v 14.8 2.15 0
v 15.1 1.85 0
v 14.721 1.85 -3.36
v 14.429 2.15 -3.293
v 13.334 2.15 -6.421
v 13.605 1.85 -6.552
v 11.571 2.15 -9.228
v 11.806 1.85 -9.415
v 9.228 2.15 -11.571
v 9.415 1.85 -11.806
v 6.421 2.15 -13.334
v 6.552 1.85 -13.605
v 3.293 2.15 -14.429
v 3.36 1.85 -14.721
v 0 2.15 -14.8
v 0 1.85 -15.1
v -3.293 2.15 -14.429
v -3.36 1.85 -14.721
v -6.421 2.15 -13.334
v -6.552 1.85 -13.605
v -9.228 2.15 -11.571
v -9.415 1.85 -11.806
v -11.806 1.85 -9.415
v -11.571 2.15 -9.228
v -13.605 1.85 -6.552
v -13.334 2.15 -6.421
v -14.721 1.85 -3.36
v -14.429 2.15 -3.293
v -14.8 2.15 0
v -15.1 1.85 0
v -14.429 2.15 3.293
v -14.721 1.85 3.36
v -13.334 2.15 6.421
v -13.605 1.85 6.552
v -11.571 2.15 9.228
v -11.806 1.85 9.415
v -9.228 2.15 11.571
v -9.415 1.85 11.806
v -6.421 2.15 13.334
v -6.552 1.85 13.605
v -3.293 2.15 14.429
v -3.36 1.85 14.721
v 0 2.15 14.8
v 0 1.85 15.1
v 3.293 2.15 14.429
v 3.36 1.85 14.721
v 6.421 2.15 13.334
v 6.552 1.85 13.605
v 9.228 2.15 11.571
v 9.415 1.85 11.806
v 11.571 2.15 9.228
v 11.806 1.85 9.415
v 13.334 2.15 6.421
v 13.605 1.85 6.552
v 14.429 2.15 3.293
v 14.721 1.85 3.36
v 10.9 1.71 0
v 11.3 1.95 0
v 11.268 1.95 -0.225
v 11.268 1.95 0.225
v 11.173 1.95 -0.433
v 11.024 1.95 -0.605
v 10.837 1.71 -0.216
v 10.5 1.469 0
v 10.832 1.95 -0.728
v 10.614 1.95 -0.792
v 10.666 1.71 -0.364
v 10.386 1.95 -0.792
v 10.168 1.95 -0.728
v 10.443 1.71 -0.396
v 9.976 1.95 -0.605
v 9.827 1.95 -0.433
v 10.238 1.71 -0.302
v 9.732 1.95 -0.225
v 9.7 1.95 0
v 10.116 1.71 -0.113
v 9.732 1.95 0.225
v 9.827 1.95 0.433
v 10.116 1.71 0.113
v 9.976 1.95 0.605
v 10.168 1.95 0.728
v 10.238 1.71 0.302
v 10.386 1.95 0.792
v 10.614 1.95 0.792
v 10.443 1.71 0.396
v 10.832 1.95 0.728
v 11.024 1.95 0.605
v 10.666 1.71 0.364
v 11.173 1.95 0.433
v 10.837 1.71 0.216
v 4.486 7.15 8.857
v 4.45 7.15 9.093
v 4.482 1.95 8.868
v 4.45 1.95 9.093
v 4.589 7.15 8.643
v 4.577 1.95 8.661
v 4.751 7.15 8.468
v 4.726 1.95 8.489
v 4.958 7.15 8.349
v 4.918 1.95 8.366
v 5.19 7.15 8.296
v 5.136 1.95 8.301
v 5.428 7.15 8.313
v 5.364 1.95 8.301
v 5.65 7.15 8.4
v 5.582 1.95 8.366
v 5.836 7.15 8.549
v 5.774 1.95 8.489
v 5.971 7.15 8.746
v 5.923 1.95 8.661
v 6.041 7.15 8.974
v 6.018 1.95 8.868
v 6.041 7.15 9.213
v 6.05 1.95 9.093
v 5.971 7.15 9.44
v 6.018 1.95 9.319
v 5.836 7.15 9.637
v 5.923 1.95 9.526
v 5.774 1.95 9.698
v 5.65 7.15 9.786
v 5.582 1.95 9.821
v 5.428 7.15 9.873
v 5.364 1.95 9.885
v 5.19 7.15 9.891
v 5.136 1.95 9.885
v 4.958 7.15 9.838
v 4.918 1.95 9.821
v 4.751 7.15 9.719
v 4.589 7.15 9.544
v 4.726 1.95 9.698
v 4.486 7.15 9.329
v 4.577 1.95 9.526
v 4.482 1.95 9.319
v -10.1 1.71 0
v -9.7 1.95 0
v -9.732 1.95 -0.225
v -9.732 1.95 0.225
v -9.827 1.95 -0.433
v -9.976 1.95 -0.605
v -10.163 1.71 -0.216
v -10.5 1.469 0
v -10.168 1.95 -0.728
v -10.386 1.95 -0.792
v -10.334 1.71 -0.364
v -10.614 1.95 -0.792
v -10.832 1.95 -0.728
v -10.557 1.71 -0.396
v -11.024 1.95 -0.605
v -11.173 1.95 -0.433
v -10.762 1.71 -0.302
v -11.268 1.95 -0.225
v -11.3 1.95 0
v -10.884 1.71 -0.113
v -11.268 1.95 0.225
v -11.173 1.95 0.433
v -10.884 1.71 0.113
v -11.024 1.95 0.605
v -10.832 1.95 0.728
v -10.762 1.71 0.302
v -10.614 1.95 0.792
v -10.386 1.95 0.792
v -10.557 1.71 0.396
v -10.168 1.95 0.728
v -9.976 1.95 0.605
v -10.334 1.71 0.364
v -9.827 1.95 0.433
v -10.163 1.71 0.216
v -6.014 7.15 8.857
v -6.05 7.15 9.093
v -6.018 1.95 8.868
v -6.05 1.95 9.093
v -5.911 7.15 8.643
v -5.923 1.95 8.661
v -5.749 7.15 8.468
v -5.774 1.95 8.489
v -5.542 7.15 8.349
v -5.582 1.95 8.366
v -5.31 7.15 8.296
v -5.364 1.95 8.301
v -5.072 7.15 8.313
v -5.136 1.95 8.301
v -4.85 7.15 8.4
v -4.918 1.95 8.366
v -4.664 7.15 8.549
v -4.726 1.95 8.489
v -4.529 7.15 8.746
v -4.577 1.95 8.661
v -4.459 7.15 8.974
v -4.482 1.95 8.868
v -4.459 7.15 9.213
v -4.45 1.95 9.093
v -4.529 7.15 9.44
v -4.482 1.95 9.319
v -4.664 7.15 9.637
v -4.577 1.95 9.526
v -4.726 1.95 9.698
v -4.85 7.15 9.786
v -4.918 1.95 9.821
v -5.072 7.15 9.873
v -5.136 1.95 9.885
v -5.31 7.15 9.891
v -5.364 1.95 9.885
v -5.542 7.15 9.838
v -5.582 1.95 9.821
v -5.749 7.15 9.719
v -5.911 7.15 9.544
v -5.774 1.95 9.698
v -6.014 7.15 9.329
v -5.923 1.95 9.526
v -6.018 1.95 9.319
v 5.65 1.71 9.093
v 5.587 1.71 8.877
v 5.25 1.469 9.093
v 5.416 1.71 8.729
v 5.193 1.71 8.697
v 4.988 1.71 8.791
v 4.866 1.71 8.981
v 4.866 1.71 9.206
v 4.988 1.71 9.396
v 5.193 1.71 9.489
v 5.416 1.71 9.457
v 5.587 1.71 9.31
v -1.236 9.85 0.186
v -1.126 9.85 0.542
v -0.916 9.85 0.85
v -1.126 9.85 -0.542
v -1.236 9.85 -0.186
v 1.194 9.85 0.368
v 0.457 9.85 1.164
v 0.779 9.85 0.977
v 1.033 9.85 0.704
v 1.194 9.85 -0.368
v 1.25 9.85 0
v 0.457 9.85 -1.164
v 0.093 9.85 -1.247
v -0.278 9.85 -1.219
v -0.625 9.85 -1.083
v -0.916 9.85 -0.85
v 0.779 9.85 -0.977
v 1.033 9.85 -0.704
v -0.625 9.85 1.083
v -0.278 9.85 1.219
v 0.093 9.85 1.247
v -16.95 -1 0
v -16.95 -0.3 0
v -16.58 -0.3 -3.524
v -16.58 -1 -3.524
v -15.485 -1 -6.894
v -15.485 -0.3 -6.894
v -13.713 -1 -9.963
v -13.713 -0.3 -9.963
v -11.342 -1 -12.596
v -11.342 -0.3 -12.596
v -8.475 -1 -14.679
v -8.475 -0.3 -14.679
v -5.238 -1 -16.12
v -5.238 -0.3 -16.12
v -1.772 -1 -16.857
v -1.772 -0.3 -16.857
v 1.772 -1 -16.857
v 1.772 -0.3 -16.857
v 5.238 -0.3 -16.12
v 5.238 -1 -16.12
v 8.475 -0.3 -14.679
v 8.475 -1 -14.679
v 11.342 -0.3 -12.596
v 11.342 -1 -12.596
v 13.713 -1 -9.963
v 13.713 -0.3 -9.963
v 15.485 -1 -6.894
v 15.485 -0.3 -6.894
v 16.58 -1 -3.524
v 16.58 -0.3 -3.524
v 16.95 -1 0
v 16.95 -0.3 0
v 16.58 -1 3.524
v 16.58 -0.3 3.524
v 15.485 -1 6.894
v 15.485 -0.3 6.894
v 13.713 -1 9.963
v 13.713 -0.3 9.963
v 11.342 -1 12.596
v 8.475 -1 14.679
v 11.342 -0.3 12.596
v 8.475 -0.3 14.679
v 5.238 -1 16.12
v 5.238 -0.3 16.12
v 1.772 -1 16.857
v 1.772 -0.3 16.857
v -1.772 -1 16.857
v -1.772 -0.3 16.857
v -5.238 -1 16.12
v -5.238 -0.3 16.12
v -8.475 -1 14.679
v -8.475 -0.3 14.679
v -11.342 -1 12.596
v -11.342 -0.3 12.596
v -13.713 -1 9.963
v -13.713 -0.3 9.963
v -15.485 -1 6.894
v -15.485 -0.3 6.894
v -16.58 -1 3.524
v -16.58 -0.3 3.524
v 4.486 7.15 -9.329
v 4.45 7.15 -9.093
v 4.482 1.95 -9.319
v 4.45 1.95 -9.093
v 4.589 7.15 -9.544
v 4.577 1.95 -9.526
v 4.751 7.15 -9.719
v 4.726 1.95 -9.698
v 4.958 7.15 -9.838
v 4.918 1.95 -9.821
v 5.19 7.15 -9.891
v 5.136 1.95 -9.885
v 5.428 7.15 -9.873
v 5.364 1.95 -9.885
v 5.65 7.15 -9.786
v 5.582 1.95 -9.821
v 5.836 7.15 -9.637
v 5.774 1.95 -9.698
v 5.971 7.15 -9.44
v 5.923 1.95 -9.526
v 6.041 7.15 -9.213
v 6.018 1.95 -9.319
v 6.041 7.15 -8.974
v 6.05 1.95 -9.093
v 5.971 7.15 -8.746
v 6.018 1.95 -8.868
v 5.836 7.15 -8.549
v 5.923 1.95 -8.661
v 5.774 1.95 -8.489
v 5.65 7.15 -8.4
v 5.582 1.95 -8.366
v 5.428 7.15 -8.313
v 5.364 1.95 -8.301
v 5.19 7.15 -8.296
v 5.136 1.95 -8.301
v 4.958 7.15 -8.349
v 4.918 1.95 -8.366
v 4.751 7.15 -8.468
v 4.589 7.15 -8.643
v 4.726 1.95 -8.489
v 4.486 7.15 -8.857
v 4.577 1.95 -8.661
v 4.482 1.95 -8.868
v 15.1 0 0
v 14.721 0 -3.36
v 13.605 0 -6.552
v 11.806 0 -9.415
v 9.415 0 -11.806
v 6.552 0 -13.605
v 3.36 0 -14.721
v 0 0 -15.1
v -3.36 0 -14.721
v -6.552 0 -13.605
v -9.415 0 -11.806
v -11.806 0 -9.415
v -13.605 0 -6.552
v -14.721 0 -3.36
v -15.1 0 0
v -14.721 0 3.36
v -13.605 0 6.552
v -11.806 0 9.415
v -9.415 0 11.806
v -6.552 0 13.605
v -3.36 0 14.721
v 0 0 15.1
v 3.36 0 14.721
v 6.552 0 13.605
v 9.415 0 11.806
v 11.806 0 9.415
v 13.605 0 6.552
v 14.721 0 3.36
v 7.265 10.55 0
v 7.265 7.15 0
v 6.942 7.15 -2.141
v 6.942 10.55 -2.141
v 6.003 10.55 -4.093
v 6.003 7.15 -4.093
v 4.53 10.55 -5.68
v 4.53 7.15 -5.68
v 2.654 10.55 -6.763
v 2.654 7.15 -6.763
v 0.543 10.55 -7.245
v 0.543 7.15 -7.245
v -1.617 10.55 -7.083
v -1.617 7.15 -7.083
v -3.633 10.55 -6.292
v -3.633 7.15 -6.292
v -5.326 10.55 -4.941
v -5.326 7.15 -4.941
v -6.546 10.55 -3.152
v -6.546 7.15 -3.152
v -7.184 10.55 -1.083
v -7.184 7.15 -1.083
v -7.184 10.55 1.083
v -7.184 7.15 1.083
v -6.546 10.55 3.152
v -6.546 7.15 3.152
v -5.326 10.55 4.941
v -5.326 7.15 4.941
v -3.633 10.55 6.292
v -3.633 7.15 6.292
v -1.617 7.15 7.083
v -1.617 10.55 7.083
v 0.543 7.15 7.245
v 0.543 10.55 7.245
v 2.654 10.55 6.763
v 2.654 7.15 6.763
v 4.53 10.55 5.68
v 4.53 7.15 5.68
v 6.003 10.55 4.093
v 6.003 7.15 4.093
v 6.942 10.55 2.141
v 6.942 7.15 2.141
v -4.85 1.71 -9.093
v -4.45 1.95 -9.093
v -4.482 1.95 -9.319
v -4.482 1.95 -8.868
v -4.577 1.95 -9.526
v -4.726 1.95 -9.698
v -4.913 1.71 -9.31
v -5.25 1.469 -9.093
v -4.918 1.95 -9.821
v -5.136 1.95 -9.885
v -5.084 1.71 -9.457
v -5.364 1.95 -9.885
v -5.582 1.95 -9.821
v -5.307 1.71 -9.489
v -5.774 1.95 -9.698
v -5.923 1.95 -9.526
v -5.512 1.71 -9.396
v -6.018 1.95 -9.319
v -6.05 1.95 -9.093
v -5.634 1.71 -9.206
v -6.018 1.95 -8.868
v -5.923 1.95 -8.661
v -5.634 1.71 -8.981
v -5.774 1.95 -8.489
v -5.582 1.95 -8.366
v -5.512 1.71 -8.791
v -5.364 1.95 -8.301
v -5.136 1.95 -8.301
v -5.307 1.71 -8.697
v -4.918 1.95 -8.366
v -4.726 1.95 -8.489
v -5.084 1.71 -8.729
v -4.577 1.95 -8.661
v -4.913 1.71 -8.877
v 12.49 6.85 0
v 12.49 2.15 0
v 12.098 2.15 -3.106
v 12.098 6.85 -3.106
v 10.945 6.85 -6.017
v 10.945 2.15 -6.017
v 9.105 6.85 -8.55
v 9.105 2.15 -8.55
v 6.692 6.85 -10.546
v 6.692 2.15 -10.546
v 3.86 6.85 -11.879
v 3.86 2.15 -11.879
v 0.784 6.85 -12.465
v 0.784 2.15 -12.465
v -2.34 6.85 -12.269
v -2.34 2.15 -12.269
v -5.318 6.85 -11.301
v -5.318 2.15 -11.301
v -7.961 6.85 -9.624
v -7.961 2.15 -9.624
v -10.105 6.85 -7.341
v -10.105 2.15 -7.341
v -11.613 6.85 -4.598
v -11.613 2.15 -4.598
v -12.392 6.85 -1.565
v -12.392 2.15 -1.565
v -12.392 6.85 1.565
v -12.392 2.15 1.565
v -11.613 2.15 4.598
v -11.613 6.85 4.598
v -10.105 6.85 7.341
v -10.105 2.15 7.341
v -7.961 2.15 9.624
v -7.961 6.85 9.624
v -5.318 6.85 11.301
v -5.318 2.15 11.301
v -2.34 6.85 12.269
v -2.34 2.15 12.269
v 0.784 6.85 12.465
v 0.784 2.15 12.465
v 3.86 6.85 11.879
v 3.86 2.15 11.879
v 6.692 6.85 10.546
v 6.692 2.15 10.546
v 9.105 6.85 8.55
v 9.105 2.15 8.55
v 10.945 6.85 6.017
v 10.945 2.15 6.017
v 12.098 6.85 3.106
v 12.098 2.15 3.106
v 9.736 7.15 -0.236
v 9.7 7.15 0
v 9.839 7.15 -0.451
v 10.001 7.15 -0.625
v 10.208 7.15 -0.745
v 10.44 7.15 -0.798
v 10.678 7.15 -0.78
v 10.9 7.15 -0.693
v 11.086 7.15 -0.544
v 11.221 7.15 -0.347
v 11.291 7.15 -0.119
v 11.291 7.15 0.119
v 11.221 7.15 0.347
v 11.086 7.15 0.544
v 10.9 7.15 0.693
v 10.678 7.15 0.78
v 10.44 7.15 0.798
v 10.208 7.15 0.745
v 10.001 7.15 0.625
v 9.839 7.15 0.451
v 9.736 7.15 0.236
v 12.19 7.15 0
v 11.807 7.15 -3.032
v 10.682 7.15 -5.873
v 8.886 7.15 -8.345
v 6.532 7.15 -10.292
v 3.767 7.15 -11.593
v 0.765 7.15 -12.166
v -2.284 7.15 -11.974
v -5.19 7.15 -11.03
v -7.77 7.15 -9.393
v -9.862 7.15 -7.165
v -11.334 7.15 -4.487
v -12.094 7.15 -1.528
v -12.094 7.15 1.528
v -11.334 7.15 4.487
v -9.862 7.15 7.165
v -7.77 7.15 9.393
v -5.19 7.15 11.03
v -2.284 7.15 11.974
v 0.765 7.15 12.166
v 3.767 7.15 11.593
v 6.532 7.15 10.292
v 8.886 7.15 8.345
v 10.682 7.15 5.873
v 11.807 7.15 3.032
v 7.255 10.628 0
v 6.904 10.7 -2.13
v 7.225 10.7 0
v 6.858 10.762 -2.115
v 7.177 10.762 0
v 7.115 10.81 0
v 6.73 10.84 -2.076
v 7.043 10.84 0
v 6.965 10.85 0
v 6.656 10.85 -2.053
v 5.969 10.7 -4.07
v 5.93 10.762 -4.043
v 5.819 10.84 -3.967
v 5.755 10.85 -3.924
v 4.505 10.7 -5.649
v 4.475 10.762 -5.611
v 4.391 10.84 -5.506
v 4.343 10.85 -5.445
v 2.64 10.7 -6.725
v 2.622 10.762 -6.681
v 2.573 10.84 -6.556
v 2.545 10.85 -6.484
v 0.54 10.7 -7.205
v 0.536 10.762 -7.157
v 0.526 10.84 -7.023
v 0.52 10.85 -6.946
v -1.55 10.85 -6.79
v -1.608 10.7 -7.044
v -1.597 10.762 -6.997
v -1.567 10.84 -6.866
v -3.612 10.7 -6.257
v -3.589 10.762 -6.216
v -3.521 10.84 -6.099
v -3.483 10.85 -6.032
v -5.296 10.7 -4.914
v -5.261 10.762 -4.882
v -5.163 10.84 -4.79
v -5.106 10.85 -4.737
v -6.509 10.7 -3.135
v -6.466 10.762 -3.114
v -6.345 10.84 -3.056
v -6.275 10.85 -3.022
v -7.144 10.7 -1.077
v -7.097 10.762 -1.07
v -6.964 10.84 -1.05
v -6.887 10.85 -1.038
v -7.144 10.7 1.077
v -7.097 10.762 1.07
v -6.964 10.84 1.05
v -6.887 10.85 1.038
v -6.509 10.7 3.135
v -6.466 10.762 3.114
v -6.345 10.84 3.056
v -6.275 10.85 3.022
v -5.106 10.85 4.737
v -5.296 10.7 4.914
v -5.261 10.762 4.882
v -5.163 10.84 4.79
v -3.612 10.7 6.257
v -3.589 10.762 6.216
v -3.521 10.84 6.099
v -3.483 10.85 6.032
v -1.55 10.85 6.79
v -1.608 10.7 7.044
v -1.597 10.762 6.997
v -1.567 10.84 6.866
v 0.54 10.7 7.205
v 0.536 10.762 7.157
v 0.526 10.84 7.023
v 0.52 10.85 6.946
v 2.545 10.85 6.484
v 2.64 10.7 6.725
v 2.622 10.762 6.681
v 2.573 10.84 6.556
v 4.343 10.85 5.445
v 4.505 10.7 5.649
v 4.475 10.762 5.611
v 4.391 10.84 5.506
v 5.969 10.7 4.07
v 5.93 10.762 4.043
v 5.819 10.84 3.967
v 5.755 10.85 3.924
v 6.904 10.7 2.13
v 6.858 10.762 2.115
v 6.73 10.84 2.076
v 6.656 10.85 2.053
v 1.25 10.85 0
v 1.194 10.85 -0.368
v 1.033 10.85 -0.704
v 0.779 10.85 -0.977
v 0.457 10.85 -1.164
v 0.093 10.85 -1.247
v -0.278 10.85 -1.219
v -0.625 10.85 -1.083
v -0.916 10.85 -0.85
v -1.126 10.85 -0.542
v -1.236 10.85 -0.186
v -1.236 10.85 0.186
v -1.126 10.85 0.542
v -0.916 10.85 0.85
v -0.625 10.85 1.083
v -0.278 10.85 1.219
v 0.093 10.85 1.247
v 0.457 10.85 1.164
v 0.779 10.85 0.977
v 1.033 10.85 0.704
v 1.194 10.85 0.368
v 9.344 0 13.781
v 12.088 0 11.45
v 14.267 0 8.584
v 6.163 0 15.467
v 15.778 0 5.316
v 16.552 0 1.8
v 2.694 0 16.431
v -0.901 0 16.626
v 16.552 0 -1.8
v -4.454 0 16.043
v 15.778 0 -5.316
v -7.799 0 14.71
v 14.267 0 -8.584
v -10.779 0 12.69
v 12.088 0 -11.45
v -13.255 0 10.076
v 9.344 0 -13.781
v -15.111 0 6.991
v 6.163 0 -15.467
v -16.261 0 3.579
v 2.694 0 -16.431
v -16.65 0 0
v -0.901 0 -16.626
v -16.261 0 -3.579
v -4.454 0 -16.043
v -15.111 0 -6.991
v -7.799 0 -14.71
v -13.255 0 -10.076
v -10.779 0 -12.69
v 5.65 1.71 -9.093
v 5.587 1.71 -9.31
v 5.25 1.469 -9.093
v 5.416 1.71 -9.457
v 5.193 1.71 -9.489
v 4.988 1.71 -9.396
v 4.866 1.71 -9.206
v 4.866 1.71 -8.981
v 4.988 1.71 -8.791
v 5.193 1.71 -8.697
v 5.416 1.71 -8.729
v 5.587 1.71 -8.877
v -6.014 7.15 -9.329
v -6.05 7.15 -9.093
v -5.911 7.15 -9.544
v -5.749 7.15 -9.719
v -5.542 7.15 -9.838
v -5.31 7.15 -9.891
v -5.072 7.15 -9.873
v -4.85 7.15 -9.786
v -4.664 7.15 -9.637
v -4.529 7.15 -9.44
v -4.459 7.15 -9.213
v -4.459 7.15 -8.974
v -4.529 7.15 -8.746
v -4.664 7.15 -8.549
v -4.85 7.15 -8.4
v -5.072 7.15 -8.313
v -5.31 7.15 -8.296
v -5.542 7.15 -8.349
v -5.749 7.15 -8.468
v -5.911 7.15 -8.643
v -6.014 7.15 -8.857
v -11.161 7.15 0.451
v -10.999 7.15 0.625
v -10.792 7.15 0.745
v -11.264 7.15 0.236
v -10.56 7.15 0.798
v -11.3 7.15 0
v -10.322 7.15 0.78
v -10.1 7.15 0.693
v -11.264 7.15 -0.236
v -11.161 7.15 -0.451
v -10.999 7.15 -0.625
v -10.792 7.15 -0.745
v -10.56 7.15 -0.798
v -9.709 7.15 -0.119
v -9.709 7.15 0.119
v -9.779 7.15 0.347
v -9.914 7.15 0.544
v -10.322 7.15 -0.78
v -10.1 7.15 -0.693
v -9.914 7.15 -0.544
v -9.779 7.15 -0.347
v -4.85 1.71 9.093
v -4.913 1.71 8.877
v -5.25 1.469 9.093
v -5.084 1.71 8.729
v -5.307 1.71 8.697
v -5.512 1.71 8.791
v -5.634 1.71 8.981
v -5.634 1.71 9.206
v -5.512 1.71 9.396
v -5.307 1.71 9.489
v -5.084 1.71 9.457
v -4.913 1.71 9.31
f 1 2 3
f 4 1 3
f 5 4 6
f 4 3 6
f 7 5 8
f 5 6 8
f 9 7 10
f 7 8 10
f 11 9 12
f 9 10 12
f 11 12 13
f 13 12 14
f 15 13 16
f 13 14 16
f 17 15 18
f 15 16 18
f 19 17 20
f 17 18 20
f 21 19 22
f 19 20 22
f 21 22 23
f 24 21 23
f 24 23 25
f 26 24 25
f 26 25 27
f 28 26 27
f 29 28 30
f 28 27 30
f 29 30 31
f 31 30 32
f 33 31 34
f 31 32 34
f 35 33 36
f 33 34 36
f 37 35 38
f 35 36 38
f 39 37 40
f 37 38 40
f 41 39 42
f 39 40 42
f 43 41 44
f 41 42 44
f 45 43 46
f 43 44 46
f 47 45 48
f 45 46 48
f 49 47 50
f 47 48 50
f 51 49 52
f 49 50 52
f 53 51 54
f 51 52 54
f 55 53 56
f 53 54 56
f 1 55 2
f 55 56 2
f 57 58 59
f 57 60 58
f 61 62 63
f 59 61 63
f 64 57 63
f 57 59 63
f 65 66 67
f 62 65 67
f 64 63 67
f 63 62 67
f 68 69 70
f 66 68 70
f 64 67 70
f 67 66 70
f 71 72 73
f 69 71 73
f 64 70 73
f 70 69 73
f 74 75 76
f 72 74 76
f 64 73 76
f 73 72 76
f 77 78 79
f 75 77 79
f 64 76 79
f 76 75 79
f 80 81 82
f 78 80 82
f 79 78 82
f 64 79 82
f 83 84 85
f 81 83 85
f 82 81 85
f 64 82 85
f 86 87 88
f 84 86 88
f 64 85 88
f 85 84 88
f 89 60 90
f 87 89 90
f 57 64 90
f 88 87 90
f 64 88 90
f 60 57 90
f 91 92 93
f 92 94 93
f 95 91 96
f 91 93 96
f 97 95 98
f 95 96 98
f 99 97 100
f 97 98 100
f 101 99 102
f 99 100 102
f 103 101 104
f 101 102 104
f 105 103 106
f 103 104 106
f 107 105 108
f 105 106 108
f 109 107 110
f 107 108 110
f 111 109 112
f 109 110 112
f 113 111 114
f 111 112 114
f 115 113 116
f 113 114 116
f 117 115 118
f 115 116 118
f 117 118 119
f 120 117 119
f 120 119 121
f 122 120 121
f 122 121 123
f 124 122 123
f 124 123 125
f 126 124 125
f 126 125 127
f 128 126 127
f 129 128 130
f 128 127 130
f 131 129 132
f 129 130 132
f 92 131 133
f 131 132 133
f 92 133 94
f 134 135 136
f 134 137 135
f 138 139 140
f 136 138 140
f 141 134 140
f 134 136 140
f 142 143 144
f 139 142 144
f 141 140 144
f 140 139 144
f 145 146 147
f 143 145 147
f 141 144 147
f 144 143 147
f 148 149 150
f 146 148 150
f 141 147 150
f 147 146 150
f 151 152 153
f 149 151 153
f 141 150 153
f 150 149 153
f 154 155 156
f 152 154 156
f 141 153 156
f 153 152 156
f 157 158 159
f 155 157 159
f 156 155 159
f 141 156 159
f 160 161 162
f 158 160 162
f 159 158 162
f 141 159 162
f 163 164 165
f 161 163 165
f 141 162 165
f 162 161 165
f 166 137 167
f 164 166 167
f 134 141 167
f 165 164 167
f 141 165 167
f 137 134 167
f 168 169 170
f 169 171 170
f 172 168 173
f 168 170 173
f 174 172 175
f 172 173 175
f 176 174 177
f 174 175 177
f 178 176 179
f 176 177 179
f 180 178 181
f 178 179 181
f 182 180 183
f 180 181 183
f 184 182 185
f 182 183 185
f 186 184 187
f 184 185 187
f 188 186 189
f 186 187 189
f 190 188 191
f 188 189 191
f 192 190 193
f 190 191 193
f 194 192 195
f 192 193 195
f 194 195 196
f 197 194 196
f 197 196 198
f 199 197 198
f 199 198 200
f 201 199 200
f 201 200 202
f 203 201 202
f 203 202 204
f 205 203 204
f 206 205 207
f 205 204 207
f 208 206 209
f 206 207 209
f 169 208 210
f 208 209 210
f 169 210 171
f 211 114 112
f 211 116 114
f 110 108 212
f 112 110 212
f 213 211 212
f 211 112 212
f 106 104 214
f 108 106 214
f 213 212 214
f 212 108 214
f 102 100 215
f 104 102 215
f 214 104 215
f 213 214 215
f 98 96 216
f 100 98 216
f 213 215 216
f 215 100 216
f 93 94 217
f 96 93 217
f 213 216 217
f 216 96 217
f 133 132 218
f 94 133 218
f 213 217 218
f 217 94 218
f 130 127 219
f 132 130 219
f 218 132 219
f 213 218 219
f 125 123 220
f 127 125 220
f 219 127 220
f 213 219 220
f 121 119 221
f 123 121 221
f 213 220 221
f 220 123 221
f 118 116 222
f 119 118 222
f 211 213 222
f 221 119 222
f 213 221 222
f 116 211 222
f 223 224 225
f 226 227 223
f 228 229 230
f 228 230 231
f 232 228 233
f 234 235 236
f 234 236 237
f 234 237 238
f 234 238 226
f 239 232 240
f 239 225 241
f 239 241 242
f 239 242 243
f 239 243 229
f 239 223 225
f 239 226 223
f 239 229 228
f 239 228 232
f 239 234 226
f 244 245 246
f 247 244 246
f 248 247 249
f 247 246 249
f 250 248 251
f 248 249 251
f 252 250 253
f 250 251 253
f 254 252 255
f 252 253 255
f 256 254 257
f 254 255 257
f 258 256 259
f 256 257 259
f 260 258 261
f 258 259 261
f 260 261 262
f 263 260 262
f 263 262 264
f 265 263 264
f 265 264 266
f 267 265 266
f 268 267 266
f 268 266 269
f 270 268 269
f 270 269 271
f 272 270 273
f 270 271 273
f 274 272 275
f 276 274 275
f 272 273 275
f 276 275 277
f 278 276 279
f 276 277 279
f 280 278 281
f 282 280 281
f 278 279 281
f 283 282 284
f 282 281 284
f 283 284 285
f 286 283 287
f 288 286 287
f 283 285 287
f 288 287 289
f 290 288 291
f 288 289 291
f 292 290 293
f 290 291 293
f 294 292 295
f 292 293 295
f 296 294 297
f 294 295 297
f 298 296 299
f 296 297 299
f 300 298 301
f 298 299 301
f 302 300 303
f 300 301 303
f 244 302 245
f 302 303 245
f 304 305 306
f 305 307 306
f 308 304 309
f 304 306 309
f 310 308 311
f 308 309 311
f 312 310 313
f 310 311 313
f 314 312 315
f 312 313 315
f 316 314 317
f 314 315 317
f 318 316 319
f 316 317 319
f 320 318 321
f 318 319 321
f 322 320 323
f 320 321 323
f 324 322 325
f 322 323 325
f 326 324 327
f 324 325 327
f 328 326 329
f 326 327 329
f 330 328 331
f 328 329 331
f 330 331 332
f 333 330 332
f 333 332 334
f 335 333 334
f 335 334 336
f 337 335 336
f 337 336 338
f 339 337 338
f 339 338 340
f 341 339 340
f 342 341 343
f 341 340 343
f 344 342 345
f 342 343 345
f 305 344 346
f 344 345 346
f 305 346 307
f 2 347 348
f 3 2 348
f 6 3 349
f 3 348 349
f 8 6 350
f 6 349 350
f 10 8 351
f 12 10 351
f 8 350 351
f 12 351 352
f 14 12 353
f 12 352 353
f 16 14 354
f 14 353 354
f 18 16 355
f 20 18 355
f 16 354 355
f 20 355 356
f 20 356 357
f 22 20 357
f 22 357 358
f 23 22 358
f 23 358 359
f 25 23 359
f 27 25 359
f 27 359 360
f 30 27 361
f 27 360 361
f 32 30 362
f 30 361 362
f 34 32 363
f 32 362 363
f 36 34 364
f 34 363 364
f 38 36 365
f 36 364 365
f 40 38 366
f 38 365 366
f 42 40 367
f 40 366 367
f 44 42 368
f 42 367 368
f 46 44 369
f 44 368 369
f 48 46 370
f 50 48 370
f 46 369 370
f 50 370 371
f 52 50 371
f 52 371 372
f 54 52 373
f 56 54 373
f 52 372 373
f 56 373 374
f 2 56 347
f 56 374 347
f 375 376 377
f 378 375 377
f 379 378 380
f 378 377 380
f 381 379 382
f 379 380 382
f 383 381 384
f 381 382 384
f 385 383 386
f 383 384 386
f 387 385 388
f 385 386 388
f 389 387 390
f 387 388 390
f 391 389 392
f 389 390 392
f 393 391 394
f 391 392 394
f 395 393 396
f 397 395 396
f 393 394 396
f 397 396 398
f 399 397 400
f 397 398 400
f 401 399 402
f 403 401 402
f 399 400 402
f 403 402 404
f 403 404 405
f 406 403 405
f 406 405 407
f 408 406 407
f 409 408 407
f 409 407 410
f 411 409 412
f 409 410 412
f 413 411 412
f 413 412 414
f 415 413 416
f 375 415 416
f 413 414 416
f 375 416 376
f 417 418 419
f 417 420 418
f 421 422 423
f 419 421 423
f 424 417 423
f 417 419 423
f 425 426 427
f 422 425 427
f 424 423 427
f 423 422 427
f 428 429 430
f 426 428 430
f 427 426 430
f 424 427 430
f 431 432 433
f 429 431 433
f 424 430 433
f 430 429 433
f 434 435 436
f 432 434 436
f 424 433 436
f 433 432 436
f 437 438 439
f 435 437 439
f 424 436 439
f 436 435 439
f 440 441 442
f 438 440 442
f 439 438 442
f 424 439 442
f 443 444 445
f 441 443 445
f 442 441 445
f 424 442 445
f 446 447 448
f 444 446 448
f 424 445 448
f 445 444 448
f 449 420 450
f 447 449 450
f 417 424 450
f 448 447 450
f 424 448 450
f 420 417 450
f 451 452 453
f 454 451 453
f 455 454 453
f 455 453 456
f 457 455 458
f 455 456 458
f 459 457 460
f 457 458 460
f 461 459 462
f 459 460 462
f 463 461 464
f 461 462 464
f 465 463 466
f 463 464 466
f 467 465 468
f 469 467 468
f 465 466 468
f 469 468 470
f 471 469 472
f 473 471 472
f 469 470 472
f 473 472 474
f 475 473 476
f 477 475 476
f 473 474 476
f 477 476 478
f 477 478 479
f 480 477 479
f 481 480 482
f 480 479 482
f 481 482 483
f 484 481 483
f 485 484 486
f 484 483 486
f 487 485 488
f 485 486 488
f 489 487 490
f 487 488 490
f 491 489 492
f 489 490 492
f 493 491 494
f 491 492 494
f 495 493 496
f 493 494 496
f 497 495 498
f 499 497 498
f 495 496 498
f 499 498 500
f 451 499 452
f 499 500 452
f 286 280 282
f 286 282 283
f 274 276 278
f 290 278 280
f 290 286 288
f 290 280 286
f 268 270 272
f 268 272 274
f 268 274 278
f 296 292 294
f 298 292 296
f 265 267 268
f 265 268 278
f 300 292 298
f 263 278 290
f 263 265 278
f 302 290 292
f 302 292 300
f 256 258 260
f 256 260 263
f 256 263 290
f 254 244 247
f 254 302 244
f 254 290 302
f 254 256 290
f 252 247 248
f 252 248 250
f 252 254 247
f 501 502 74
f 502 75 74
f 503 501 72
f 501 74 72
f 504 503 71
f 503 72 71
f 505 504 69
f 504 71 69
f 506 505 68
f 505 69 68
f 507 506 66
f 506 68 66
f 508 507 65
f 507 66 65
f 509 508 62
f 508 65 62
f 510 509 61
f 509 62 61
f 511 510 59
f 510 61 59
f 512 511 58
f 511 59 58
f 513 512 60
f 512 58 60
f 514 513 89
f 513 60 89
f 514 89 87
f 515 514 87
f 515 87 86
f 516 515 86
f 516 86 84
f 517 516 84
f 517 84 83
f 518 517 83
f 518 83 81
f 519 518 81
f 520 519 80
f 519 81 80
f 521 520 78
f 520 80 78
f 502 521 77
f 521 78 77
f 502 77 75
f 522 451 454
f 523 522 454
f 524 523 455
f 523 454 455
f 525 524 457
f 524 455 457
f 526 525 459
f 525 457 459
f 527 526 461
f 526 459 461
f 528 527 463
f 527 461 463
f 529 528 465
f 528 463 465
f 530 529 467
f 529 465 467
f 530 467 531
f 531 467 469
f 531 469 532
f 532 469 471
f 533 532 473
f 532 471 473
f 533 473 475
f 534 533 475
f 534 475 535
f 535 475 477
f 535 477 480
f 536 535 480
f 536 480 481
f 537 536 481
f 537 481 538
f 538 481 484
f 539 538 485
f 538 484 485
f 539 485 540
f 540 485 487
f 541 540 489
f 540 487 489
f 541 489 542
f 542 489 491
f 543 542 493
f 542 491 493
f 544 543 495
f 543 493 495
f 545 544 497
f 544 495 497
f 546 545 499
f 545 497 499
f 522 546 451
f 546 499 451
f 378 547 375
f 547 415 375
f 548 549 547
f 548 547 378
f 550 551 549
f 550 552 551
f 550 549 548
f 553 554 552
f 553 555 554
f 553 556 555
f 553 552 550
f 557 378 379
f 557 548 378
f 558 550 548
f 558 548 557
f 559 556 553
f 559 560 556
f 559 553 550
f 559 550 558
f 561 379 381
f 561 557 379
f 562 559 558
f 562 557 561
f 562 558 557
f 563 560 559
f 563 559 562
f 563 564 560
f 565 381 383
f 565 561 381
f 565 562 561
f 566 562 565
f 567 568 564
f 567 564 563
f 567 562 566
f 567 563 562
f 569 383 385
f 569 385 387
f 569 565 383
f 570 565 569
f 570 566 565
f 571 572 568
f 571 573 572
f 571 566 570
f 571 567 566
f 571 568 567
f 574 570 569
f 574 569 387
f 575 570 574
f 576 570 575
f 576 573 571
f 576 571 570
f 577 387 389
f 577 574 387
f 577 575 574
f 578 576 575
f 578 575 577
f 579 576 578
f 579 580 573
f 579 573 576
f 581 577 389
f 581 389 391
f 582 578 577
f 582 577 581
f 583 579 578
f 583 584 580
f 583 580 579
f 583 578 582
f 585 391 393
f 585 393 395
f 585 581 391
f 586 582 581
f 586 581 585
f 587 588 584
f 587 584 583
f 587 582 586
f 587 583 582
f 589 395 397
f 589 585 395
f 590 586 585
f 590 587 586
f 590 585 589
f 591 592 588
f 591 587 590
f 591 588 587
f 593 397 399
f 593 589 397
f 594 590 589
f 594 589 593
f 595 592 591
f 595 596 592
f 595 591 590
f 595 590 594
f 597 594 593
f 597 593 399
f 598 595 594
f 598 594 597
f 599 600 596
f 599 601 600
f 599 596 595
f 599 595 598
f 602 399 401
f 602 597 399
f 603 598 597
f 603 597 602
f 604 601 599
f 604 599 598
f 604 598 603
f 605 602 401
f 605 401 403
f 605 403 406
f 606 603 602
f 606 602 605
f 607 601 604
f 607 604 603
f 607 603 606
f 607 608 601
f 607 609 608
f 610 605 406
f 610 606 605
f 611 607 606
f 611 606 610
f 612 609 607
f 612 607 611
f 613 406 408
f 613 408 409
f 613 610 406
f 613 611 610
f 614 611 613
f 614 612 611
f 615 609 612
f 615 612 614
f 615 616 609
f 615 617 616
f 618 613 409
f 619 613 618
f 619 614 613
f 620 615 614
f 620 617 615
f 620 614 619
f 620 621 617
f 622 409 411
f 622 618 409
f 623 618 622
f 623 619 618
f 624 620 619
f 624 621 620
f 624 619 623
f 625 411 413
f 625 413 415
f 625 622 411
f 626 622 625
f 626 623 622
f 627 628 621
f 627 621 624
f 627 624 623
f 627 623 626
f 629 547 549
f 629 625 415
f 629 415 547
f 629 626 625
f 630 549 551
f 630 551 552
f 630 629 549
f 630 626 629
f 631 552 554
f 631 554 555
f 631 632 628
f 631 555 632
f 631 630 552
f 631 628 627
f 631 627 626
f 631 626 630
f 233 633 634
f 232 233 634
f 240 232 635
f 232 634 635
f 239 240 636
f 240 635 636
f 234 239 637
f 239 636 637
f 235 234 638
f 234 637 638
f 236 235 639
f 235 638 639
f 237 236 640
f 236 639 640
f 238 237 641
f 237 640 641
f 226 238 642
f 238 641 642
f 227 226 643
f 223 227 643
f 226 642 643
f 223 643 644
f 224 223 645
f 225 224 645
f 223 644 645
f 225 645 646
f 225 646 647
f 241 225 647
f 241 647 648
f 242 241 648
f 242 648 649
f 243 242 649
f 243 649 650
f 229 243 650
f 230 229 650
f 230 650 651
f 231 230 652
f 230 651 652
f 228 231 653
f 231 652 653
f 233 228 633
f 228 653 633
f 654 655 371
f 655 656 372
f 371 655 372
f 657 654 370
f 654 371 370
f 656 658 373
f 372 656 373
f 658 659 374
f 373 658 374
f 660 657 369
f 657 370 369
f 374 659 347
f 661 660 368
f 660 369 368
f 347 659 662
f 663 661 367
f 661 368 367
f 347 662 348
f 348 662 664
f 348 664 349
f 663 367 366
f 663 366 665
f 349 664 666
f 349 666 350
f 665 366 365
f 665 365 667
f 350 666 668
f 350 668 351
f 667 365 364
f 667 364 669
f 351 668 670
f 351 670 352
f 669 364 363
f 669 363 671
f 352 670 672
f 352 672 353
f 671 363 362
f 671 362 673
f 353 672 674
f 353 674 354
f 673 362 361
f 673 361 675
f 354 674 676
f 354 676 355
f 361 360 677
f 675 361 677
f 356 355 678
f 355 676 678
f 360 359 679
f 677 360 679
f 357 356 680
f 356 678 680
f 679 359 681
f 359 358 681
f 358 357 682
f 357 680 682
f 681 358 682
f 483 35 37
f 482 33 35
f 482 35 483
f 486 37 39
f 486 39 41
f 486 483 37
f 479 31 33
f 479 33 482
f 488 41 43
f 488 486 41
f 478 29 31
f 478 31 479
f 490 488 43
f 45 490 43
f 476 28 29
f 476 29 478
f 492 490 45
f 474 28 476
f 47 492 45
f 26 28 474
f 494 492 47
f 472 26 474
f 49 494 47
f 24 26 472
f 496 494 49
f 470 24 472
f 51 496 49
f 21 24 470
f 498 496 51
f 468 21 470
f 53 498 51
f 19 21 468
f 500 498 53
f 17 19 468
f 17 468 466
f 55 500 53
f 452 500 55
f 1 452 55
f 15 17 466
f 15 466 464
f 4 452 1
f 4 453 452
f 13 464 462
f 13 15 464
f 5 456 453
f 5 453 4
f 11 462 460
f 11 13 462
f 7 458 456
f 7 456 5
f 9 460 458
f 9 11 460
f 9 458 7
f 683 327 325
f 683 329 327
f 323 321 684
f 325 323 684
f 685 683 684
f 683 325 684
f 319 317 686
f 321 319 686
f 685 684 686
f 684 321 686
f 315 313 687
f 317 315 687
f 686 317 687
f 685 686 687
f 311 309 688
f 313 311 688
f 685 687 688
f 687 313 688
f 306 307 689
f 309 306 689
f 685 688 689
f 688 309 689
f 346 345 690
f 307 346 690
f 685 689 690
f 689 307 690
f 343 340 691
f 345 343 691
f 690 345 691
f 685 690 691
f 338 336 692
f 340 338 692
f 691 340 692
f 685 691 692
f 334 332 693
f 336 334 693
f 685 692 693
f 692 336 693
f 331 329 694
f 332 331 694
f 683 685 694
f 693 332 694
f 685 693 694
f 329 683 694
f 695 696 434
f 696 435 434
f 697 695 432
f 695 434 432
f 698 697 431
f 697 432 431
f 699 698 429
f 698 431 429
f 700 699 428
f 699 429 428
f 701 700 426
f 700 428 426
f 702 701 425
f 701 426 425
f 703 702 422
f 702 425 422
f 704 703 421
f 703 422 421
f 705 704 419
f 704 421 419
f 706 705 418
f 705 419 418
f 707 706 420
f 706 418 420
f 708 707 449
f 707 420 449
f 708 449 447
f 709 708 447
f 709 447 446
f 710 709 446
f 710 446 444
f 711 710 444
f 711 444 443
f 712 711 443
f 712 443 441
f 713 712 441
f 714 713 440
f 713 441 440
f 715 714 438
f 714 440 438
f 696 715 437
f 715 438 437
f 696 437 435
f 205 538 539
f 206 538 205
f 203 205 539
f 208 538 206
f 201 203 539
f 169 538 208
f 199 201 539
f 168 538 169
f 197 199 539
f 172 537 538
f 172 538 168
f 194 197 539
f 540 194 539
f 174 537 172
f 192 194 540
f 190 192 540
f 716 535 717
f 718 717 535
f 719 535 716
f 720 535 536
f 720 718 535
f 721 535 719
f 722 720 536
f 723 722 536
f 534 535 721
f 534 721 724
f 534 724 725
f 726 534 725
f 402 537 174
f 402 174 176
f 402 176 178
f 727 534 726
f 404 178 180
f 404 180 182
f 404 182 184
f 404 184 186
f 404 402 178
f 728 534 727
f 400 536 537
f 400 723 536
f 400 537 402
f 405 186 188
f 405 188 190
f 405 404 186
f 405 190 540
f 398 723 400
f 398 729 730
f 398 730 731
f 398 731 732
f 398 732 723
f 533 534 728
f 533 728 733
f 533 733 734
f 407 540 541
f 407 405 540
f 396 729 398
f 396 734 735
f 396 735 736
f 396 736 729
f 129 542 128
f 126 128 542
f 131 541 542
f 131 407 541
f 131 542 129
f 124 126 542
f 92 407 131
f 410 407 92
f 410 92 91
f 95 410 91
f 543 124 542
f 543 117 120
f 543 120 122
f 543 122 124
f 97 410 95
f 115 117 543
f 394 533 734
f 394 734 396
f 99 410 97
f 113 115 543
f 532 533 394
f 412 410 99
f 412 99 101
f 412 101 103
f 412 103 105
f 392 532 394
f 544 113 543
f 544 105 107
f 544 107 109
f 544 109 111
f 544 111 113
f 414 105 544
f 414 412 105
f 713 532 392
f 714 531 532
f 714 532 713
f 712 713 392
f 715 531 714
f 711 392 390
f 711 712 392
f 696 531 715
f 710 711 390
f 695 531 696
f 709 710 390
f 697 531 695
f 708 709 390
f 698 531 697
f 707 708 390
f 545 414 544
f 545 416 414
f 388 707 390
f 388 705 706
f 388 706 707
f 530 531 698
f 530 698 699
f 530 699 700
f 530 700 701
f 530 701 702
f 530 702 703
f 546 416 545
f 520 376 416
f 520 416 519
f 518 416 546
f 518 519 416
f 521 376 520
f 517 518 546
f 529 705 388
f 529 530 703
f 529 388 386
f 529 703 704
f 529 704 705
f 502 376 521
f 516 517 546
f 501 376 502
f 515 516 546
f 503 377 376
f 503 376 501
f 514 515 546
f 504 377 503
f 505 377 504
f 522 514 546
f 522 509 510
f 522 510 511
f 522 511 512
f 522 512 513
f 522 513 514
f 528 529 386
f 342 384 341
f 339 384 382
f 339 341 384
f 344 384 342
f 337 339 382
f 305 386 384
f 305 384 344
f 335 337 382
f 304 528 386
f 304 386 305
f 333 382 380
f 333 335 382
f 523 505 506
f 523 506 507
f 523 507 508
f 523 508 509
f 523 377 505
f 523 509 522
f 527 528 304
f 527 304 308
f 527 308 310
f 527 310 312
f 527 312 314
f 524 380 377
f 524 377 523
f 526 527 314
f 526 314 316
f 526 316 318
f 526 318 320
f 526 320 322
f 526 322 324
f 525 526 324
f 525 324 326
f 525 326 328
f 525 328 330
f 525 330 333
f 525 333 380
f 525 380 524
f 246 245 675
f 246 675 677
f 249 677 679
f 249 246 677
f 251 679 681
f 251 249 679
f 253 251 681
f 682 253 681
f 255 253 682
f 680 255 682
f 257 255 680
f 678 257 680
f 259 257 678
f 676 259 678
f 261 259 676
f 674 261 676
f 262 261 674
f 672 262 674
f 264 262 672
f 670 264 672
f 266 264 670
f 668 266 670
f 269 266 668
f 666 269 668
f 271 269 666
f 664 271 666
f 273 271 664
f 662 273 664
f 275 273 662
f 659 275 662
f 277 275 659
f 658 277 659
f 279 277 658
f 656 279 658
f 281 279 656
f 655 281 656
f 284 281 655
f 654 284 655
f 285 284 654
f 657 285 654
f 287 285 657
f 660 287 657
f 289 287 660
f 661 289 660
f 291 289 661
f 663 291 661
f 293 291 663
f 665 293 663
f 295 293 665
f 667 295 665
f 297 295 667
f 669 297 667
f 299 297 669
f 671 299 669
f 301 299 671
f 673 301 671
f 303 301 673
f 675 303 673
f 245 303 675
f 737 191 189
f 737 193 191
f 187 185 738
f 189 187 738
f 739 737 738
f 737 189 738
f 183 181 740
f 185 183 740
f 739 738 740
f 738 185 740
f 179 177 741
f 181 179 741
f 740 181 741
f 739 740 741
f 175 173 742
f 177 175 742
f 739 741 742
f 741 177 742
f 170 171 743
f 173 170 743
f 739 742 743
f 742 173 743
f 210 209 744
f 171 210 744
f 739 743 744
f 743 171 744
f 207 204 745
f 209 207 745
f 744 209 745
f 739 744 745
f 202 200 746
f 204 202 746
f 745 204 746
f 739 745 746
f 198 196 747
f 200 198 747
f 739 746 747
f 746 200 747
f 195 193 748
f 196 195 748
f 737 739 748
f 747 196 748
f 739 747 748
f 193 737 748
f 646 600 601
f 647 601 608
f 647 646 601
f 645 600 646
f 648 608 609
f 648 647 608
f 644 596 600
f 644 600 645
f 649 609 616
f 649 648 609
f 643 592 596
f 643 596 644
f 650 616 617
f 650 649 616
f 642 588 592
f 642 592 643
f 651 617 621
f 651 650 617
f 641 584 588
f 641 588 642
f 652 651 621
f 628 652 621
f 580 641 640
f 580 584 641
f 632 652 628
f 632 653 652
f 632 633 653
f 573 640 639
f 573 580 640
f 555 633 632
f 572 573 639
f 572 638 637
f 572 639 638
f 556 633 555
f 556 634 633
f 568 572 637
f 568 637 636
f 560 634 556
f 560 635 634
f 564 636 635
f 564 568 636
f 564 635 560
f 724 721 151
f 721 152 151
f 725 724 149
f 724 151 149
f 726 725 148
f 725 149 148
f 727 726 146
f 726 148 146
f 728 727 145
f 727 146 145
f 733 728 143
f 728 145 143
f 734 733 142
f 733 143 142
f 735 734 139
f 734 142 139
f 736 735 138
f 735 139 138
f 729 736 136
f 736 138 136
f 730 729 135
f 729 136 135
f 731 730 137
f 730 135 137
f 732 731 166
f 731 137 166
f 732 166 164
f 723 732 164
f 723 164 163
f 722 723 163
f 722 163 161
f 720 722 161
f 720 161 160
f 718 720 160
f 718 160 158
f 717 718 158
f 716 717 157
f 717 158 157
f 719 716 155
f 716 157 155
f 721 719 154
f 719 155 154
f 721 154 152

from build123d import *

# Parameters (mm, degrees)
SKETCH_1_R             = 15.1
EXTRUDE_1_DEPTH        = 2.15
SKETCH_2_R             = 12.49
EXTRUDE_2_DEPTH        = 5
SKETCH_3_R             = 7.265
EXTRUDE_3_DEPTH        = 3.7
SKETCH_4_R             = 16.95
EXTRUDE_4_DEPTH        = 1
SKETCH_5_R             = 1.25
CUT_EXTRUDE_1_DEPTH    = 1
FILLET_1_R             = 0.3
CHAMFER_1_SIZE         = 0.3
HOLE_WIZARD_M2_1_D     = 1.6
HOLE_WIZARD_M2_1_DEPTH = 5.2
HOLE_WIZARD_M2_1_TIP   = 0.480688495


with BuildPart() as part:
    # 草图1 → 凸台-拉伸1 (new body)
    with BuildSketch(Plane(origin=(0, 0, 0), x_dir=(1, 0, 0), z_dir=(0, 1, 0))):
        Circle(SKETCH_1_R)
    extrude(amount=EXTRUDE_1_DEPTH)

    # 草图2 → 凸台-拉伸2 (add)
    with BuildSketch(Plane(origin=(0, 2.15, 0), x_dir=(1, 0, 0), z_dir=(0, 1, 0))):
        Circle(SKETCH_2_R)
    extrude(amount=EXTRUDE_2_DEPTH)

    # 草图3 → 凸台-拉伸3 (add)
    with BuildSketch(Plane(origin=(0, 7.15, 0), x_dir=(1, 0, 0), z_dir=(0, 1, 0))):
        Circle(SKETCH_3_R)
    extrude(amount=EXTRUDE_3_DEPTH)

    # 草图4 → 凸台-拉伸4 (add)
    with BuildSketch(Plane(origin=(0, 0, 0), x_dir=(-1, 0, 0), z_dir=(0, -1, 0))):
        Circle(SKETCH_4_R)
    extrude(amount=EXTRUDE_4_DEPTH)

    # 草图5 → 切除-拉伸1 (cut)
    with BuildSketch(Plane(origin=(0, 10.85, 0), x_dir=(1, 0, 0), z_dir=(0, 1, 0))):
        Circle(SKETCH_5_R)
    extrude(amount=-CUT_EXTRUDE_1_DEPTH, mode=Mode.SUBTRACT)

    # 圆角1
    fillet_1_edges = [part.edges().sort_by_distance(p)[0] for p in [
        (-7.265, 10.85, 0),
    ]]
    fillet(fillet_1_edges, radius=FILLET_1_R)

    # 倒角1
    chamfer_1_edges = [part.edges().sort_by_distance(p)[0] for p in [
        (16.95, 0, 0),
        (-15.1, 2.15, 0),
        (-12.49, 7.15, 0),
    ]]
    chamfer(chamfer_1_edges, length=CHAMFER_1_SIZE)

    # M2 螺纹孔1
    with Locations(Plane(origin=(0, 7.15, 0), x_dir=(1, 0, 0), z_dir=(0, 1, 0))):
        with Locations((5.25, 9.09326674), (10.5, 0), (5.25, -9.09326674), (-5.25, -9.09326674), (-10.5, 0), (-5.25, 9.09326674)):
            Hole(HOLE_WIZARD_M2_1_D / 2, depth=HOLE_WIZARD_M2_1_DEPTH)
            with Locations((0, 0, -(HOLE_WIZARD_M2_1_DEPTH + HOLE_WIZARD_M2_1_TIP / 2))):  # 118° drill point
                Cone(0, HOLE_WIZARD_M2_1_D / 2, HOLE_WIZARD_M2_1_TIP, mode=Mode.SUBTRACT)


solid = part.part
